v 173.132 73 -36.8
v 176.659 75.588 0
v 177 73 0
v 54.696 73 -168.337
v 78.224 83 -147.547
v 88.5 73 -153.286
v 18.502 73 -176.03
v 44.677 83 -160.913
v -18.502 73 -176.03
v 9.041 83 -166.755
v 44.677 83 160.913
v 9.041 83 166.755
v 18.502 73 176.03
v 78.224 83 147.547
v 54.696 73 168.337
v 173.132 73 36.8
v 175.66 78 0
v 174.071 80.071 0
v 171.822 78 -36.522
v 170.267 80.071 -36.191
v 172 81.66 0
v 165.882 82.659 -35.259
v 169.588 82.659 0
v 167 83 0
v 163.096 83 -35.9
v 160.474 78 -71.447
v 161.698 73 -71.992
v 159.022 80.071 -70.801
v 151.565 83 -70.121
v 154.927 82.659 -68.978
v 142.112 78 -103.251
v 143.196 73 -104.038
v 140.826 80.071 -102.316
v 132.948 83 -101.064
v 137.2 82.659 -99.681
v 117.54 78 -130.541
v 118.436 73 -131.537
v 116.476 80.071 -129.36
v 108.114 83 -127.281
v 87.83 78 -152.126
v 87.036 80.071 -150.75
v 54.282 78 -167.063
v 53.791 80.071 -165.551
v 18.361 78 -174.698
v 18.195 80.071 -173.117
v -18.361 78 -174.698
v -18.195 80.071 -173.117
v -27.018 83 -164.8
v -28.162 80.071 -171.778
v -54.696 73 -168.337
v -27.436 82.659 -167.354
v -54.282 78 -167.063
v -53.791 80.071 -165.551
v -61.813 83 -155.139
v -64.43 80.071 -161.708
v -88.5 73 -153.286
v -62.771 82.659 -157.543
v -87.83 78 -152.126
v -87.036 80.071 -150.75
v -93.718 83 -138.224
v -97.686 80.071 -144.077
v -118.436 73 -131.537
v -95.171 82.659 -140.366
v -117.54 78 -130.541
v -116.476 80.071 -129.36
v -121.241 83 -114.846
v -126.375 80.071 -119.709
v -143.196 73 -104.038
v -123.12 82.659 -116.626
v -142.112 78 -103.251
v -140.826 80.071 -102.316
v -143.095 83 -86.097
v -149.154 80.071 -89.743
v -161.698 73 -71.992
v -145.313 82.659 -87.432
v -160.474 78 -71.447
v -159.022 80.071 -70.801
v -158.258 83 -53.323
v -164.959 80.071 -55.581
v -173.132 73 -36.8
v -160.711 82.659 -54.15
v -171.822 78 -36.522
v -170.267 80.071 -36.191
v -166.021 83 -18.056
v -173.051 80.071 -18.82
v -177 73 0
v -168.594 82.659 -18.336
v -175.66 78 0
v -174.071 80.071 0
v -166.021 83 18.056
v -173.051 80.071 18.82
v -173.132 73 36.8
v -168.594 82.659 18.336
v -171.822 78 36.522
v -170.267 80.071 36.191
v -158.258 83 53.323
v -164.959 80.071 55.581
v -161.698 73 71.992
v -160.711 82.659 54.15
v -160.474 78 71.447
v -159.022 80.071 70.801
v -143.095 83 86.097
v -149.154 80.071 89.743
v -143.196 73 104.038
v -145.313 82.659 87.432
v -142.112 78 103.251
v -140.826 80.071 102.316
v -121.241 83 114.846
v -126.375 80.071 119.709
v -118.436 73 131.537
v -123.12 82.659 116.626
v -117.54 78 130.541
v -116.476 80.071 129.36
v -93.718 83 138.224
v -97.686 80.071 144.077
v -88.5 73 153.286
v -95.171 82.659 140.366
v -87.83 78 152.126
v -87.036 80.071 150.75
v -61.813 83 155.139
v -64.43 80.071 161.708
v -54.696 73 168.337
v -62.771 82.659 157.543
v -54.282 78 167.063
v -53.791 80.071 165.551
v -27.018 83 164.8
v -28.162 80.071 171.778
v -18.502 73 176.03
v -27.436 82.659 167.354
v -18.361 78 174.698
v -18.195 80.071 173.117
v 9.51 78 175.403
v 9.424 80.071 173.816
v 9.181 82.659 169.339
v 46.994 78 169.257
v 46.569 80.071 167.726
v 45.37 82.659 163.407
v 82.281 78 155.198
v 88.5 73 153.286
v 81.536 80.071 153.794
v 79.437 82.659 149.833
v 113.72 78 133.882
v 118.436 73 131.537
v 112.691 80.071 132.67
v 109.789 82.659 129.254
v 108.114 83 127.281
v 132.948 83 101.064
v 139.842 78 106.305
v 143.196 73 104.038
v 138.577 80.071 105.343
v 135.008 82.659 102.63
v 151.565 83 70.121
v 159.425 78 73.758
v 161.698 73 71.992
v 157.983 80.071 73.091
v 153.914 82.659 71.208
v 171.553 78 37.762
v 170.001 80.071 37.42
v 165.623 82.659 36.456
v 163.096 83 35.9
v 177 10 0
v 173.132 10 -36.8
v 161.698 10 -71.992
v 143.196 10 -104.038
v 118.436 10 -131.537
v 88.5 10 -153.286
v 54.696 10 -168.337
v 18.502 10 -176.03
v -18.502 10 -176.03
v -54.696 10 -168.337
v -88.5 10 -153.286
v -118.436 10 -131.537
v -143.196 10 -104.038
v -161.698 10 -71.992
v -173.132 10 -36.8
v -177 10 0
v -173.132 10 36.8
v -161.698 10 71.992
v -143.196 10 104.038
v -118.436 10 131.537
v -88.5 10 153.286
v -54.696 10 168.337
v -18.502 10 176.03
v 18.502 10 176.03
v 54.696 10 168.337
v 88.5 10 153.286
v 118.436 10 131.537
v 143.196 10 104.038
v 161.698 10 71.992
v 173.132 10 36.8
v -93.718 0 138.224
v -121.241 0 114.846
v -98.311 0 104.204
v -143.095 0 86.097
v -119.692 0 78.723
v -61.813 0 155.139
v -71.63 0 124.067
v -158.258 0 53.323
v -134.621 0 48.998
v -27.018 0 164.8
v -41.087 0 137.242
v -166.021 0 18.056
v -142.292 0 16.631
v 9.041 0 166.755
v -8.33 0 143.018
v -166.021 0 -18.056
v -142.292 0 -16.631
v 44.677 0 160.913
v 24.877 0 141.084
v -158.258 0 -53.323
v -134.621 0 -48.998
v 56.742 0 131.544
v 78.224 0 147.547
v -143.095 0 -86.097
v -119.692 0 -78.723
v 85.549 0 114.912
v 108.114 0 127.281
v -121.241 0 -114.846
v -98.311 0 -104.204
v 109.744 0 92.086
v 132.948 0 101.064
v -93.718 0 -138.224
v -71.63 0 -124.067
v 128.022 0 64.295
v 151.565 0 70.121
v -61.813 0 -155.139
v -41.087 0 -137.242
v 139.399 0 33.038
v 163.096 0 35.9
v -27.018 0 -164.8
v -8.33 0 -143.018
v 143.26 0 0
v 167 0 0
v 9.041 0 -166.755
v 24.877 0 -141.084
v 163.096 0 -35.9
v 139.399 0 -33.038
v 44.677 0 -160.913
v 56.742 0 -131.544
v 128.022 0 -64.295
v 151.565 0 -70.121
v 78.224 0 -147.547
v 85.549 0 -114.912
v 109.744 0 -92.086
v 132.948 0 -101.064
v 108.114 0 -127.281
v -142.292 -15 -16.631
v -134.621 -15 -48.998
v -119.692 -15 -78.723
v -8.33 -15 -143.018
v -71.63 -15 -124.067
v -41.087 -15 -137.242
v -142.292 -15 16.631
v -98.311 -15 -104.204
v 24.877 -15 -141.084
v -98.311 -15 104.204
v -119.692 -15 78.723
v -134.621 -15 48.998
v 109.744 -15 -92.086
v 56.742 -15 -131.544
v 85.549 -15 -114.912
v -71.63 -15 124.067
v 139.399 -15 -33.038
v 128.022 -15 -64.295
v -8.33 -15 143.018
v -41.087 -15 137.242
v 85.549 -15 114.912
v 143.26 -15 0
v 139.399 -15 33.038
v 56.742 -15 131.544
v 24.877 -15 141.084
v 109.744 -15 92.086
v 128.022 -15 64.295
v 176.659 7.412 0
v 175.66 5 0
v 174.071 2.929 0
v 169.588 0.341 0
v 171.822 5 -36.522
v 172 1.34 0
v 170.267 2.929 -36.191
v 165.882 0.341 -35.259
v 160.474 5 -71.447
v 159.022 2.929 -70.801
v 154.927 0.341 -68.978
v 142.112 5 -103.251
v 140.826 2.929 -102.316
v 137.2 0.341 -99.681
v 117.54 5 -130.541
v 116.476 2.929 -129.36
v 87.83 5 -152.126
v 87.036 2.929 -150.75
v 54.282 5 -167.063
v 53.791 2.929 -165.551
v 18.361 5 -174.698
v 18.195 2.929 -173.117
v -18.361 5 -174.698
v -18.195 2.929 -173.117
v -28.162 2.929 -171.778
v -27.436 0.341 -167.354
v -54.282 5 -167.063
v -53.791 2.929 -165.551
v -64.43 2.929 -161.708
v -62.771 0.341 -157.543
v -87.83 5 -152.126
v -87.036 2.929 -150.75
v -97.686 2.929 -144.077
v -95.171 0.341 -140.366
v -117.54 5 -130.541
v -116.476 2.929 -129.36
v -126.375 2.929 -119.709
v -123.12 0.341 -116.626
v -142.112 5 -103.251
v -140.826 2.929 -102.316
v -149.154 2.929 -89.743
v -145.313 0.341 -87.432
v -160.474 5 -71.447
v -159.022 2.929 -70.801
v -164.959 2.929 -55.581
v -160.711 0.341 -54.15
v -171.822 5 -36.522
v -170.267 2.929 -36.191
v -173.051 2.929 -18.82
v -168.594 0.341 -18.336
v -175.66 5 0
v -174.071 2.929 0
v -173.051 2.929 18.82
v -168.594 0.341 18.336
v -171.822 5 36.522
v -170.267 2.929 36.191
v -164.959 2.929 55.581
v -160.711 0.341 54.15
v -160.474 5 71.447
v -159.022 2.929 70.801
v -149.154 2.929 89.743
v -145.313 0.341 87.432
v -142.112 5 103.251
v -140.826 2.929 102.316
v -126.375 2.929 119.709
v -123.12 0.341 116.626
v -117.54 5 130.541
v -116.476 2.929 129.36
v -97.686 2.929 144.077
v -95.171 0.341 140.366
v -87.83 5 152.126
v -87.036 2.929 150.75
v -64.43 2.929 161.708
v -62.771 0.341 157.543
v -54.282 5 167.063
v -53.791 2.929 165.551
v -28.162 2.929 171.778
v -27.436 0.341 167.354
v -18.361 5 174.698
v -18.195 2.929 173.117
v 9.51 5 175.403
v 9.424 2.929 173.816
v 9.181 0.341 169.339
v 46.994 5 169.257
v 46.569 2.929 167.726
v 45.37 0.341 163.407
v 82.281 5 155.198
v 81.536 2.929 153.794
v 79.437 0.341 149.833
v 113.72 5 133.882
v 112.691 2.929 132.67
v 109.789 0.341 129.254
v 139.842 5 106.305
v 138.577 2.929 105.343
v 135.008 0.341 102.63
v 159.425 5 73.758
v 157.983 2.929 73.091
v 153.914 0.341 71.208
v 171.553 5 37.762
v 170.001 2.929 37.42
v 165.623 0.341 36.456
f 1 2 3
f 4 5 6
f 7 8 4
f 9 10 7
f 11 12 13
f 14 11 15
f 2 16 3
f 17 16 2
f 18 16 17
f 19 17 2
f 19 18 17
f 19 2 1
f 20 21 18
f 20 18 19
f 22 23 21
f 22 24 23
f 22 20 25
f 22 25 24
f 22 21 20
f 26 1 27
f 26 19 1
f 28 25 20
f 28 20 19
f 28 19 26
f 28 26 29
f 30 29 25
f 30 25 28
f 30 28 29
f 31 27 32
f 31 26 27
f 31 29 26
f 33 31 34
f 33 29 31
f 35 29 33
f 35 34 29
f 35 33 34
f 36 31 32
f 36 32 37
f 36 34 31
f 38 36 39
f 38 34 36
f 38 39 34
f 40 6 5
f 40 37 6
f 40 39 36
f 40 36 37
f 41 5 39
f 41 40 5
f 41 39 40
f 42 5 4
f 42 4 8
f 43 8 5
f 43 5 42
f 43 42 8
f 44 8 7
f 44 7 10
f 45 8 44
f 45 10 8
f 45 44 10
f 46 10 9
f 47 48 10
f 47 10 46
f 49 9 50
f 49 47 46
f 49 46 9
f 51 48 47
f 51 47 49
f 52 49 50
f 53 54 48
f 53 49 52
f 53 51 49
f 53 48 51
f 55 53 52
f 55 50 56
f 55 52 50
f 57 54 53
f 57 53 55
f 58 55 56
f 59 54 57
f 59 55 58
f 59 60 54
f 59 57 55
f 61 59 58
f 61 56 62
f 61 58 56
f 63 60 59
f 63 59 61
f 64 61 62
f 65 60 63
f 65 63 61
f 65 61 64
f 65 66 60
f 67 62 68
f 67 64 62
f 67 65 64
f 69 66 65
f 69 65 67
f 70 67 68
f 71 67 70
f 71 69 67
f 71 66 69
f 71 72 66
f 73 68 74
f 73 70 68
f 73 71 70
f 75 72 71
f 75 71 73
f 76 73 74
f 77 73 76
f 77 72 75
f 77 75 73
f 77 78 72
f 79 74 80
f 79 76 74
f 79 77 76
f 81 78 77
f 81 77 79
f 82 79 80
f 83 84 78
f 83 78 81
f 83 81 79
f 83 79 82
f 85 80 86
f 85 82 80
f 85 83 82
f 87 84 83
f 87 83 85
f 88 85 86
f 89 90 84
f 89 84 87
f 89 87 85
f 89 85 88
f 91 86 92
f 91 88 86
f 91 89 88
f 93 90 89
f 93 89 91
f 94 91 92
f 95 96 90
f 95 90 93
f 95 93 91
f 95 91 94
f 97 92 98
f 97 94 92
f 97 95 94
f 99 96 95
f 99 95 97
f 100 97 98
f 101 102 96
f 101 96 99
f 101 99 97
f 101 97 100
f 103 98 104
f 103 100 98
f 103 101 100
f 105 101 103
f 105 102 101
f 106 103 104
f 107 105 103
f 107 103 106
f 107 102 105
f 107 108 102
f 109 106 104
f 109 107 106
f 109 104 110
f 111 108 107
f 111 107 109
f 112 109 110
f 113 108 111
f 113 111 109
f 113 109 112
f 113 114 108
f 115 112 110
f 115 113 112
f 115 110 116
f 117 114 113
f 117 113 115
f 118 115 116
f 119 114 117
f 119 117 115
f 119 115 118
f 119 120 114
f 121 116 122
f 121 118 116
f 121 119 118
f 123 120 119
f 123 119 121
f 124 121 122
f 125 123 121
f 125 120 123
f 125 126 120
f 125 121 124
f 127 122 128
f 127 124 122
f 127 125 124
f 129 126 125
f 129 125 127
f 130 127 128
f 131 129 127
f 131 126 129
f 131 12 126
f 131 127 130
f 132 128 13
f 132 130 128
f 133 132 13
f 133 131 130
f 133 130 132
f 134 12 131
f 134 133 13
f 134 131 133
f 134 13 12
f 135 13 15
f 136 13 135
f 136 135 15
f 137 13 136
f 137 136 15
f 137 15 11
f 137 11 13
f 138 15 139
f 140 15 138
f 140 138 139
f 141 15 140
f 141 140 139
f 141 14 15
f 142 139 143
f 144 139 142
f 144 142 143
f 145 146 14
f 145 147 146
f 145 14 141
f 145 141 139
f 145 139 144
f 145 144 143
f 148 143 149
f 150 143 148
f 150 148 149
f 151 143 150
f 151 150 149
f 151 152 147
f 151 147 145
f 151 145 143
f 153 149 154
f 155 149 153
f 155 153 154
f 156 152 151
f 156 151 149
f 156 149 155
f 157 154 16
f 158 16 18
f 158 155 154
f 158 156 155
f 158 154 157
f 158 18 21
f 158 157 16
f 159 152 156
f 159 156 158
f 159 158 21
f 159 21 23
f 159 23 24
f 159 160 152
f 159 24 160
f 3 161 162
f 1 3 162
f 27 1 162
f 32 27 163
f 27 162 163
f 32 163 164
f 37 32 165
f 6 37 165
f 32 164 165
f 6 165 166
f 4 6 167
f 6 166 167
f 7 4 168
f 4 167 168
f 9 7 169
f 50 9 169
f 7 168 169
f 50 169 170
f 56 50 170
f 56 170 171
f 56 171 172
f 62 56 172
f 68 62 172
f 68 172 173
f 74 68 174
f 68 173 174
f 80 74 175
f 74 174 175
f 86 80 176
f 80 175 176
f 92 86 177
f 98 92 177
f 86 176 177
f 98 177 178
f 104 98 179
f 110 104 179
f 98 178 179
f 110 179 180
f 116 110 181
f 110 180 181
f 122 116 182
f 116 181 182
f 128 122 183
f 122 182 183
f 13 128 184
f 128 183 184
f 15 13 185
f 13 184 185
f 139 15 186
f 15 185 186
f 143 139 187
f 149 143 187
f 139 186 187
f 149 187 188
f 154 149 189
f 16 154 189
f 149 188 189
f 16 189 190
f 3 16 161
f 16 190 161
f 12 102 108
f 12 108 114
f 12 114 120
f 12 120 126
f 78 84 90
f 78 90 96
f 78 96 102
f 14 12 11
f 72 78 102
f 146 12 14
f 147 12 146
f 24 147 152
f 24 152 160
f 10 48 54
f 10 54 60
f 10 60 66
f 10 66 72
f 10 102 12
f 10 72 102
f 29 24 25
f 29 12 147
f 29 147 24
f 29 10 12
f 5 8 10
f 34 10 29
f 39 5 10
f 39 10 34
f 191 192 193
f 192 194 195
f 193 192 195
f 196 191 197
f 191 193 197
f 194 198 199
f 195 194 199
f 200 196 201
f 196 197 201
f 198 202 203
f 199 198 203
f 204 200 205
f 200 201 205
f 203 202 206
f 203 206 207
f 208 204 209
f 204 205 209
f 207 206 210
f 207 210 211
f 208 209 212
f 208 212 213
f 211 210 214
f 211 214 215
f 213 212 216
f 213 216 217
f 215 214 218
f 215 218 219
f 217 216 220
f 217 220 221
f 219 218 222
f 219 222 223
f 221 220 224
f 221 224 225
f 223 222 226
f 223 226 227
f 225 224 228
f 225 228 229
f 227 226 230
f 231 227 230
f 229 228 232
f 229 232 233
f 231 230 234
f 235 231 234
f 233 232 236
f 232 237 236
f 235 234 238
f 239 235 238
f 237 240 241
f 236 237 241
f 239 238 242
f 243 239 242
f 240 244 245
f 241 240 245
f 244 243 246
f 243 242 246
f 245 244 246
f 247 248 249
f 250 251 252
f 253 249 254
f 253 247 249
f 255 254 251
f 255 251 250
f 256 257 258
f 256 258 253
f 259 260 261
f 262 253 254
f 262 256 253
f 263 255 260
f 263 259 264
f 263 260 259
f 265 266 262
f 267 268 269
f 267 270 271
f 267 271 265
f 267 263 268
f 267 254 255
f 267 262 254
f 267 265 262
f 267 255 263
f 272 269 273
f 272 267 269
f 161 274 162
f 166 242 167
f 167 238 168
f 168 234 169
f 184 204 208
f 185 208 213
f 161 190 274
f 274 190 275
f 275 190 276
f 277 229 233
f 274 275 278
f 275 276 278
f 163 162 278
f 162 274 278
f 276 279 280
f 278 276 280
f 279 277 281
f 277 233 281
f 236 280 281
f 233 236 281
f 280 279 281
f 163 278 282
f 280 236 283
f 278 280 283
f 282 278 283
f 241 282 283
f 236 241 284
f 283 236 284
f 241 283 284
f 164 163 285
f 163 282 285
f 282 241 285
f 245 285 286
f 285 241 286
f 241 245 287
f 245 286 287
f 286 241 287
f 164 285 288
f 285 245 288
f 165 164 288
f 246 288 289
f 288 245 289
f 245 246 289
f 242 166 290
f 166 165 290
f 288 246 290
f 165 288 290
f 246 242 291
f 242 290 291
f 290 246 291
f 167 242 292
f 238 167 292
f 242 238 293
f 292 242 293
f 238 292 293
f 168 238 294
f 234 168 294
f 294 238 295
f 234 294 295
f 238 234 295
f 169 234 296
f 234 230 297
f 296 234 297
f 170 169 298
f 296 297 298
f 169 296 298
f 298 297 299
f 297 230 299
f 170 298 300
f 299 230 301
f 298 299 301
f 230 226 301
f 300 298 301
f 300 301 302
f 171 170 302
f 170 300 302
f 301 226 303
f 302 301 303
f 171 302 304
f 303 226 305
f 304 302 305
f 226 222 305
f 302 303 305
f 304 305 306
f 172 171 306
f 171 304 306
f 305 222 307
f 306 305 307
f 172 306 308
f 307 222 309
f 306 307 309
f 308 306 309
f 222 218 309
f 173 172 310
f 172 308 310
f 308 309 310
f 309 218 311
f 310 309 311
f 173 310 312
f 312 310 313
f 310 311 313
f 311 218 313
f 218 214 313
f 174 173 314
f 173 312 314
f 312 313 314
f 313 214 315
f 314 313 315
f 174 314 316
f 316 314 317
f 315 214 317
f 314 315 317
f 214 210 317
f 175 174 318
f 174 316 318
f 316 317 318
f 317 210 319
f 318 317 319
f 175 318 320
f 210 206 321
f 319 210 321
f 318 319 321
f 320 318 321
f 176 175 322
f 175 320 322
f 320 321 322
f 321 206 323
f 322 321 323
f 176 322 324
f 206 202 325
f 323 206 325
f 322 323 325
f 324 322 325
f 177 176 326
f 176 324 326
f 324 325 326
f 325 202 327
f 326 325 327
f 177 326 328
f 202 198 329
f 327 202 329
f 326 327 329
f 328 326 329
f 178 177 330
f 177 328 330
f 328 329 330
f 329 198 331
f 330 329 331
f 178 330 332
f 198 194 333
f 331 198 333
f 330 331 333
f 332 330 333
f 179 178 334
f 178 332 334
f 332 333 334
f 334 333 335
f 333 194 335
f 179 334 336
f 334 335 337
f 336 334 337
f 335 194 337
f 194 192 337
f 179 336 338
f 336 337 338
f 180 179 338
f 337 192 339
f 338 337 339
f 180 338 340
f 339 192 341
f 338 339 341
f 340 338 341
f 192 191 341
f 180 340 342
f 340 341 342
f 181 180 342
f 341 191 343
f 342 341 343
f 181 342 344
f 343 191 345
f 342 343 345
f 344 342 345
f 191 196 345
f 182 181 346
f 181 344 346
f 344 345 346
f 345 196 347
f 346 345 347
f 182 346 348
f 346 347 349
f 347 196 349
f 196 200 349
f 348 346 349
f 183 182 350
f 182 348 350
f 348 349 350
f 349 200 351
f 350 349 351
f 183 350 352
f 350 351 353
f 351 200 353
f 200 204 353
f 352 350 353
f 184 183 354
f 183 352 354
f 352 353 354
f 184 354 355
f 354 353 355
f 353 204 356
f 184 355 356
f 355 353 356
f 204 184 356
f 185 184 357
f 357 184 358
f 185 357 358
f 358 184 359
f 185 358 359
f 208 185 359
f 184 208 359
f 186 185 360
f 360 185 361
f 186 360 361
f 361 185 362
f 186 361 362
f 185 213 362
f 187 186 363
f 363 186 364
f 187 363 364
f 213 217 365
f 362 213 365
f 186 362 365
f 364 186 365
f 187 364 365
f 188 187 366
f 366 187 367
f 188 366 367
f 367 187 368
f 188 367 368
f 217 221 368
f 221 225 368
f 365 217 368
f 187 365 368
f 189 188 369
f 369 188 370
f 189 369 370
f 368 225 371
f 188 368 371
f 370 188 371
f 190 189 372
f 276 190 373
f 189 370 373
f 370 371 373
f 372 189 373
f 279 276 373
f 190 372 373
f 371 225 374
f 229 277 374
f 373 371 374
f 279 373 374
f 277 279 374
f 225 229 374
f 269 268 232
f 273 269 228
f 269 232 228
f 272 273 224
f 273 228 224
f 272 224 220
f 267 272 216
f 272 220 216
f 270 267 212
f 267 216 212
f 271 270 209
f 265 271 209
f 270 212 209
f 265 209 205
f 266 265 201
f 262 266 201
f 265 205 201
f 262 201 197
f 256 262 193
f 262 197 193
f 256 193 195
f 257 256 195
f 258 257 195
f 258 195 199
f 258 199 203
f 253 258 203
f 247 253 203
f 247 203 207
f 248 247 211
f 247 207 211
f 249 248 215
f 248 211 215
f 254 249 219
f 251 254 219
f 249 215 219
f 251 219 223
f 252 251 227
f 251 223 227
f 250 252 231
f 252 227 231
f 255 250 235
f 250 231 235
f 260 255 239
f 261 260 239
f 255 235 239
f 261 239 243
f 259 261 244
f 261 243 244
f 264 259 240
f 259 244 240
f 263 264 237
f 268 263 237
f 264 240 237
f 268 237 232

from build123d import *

# Parameters (mm, degrees)
SKETCH1_R           = 177
BOSS_EXTRUDE1_DEPTH = 83
FILLET1_R           = 10
SKETCH2_R           = 143.260231918
BOSS_EXTRUDE2_DEPTH = 15


with BuildPart() as part:
    # Sketch1 → Boss-Extrude1 (new body)
    with BuildSketch(Plane(origin=(0, 0, 0), x_dir=(1, 0, 0), z_dir=(0, 1, 0))):
        Circle(SKETCH1_R)
    extrude(amount=BOSS_EXTRUDE1_DEPTH)

    # Fillet1
    fillet1_edges = [part.edges().sort_by_distance(p)[0] for p in [
        (-177, 0, 0),
        (-177, 83, 0),
    ]]
    fillet(fillet1_edges, radius=FILLET1_R)

    # Sketch2 → Boss-Extrude2 (add)
    with BuildSketch(Plane.XZ):
        Circle(SKETCH2_R)
    extrude(amount=BOSS_EXTRUDE2_DEPTH)


solid = part.part
